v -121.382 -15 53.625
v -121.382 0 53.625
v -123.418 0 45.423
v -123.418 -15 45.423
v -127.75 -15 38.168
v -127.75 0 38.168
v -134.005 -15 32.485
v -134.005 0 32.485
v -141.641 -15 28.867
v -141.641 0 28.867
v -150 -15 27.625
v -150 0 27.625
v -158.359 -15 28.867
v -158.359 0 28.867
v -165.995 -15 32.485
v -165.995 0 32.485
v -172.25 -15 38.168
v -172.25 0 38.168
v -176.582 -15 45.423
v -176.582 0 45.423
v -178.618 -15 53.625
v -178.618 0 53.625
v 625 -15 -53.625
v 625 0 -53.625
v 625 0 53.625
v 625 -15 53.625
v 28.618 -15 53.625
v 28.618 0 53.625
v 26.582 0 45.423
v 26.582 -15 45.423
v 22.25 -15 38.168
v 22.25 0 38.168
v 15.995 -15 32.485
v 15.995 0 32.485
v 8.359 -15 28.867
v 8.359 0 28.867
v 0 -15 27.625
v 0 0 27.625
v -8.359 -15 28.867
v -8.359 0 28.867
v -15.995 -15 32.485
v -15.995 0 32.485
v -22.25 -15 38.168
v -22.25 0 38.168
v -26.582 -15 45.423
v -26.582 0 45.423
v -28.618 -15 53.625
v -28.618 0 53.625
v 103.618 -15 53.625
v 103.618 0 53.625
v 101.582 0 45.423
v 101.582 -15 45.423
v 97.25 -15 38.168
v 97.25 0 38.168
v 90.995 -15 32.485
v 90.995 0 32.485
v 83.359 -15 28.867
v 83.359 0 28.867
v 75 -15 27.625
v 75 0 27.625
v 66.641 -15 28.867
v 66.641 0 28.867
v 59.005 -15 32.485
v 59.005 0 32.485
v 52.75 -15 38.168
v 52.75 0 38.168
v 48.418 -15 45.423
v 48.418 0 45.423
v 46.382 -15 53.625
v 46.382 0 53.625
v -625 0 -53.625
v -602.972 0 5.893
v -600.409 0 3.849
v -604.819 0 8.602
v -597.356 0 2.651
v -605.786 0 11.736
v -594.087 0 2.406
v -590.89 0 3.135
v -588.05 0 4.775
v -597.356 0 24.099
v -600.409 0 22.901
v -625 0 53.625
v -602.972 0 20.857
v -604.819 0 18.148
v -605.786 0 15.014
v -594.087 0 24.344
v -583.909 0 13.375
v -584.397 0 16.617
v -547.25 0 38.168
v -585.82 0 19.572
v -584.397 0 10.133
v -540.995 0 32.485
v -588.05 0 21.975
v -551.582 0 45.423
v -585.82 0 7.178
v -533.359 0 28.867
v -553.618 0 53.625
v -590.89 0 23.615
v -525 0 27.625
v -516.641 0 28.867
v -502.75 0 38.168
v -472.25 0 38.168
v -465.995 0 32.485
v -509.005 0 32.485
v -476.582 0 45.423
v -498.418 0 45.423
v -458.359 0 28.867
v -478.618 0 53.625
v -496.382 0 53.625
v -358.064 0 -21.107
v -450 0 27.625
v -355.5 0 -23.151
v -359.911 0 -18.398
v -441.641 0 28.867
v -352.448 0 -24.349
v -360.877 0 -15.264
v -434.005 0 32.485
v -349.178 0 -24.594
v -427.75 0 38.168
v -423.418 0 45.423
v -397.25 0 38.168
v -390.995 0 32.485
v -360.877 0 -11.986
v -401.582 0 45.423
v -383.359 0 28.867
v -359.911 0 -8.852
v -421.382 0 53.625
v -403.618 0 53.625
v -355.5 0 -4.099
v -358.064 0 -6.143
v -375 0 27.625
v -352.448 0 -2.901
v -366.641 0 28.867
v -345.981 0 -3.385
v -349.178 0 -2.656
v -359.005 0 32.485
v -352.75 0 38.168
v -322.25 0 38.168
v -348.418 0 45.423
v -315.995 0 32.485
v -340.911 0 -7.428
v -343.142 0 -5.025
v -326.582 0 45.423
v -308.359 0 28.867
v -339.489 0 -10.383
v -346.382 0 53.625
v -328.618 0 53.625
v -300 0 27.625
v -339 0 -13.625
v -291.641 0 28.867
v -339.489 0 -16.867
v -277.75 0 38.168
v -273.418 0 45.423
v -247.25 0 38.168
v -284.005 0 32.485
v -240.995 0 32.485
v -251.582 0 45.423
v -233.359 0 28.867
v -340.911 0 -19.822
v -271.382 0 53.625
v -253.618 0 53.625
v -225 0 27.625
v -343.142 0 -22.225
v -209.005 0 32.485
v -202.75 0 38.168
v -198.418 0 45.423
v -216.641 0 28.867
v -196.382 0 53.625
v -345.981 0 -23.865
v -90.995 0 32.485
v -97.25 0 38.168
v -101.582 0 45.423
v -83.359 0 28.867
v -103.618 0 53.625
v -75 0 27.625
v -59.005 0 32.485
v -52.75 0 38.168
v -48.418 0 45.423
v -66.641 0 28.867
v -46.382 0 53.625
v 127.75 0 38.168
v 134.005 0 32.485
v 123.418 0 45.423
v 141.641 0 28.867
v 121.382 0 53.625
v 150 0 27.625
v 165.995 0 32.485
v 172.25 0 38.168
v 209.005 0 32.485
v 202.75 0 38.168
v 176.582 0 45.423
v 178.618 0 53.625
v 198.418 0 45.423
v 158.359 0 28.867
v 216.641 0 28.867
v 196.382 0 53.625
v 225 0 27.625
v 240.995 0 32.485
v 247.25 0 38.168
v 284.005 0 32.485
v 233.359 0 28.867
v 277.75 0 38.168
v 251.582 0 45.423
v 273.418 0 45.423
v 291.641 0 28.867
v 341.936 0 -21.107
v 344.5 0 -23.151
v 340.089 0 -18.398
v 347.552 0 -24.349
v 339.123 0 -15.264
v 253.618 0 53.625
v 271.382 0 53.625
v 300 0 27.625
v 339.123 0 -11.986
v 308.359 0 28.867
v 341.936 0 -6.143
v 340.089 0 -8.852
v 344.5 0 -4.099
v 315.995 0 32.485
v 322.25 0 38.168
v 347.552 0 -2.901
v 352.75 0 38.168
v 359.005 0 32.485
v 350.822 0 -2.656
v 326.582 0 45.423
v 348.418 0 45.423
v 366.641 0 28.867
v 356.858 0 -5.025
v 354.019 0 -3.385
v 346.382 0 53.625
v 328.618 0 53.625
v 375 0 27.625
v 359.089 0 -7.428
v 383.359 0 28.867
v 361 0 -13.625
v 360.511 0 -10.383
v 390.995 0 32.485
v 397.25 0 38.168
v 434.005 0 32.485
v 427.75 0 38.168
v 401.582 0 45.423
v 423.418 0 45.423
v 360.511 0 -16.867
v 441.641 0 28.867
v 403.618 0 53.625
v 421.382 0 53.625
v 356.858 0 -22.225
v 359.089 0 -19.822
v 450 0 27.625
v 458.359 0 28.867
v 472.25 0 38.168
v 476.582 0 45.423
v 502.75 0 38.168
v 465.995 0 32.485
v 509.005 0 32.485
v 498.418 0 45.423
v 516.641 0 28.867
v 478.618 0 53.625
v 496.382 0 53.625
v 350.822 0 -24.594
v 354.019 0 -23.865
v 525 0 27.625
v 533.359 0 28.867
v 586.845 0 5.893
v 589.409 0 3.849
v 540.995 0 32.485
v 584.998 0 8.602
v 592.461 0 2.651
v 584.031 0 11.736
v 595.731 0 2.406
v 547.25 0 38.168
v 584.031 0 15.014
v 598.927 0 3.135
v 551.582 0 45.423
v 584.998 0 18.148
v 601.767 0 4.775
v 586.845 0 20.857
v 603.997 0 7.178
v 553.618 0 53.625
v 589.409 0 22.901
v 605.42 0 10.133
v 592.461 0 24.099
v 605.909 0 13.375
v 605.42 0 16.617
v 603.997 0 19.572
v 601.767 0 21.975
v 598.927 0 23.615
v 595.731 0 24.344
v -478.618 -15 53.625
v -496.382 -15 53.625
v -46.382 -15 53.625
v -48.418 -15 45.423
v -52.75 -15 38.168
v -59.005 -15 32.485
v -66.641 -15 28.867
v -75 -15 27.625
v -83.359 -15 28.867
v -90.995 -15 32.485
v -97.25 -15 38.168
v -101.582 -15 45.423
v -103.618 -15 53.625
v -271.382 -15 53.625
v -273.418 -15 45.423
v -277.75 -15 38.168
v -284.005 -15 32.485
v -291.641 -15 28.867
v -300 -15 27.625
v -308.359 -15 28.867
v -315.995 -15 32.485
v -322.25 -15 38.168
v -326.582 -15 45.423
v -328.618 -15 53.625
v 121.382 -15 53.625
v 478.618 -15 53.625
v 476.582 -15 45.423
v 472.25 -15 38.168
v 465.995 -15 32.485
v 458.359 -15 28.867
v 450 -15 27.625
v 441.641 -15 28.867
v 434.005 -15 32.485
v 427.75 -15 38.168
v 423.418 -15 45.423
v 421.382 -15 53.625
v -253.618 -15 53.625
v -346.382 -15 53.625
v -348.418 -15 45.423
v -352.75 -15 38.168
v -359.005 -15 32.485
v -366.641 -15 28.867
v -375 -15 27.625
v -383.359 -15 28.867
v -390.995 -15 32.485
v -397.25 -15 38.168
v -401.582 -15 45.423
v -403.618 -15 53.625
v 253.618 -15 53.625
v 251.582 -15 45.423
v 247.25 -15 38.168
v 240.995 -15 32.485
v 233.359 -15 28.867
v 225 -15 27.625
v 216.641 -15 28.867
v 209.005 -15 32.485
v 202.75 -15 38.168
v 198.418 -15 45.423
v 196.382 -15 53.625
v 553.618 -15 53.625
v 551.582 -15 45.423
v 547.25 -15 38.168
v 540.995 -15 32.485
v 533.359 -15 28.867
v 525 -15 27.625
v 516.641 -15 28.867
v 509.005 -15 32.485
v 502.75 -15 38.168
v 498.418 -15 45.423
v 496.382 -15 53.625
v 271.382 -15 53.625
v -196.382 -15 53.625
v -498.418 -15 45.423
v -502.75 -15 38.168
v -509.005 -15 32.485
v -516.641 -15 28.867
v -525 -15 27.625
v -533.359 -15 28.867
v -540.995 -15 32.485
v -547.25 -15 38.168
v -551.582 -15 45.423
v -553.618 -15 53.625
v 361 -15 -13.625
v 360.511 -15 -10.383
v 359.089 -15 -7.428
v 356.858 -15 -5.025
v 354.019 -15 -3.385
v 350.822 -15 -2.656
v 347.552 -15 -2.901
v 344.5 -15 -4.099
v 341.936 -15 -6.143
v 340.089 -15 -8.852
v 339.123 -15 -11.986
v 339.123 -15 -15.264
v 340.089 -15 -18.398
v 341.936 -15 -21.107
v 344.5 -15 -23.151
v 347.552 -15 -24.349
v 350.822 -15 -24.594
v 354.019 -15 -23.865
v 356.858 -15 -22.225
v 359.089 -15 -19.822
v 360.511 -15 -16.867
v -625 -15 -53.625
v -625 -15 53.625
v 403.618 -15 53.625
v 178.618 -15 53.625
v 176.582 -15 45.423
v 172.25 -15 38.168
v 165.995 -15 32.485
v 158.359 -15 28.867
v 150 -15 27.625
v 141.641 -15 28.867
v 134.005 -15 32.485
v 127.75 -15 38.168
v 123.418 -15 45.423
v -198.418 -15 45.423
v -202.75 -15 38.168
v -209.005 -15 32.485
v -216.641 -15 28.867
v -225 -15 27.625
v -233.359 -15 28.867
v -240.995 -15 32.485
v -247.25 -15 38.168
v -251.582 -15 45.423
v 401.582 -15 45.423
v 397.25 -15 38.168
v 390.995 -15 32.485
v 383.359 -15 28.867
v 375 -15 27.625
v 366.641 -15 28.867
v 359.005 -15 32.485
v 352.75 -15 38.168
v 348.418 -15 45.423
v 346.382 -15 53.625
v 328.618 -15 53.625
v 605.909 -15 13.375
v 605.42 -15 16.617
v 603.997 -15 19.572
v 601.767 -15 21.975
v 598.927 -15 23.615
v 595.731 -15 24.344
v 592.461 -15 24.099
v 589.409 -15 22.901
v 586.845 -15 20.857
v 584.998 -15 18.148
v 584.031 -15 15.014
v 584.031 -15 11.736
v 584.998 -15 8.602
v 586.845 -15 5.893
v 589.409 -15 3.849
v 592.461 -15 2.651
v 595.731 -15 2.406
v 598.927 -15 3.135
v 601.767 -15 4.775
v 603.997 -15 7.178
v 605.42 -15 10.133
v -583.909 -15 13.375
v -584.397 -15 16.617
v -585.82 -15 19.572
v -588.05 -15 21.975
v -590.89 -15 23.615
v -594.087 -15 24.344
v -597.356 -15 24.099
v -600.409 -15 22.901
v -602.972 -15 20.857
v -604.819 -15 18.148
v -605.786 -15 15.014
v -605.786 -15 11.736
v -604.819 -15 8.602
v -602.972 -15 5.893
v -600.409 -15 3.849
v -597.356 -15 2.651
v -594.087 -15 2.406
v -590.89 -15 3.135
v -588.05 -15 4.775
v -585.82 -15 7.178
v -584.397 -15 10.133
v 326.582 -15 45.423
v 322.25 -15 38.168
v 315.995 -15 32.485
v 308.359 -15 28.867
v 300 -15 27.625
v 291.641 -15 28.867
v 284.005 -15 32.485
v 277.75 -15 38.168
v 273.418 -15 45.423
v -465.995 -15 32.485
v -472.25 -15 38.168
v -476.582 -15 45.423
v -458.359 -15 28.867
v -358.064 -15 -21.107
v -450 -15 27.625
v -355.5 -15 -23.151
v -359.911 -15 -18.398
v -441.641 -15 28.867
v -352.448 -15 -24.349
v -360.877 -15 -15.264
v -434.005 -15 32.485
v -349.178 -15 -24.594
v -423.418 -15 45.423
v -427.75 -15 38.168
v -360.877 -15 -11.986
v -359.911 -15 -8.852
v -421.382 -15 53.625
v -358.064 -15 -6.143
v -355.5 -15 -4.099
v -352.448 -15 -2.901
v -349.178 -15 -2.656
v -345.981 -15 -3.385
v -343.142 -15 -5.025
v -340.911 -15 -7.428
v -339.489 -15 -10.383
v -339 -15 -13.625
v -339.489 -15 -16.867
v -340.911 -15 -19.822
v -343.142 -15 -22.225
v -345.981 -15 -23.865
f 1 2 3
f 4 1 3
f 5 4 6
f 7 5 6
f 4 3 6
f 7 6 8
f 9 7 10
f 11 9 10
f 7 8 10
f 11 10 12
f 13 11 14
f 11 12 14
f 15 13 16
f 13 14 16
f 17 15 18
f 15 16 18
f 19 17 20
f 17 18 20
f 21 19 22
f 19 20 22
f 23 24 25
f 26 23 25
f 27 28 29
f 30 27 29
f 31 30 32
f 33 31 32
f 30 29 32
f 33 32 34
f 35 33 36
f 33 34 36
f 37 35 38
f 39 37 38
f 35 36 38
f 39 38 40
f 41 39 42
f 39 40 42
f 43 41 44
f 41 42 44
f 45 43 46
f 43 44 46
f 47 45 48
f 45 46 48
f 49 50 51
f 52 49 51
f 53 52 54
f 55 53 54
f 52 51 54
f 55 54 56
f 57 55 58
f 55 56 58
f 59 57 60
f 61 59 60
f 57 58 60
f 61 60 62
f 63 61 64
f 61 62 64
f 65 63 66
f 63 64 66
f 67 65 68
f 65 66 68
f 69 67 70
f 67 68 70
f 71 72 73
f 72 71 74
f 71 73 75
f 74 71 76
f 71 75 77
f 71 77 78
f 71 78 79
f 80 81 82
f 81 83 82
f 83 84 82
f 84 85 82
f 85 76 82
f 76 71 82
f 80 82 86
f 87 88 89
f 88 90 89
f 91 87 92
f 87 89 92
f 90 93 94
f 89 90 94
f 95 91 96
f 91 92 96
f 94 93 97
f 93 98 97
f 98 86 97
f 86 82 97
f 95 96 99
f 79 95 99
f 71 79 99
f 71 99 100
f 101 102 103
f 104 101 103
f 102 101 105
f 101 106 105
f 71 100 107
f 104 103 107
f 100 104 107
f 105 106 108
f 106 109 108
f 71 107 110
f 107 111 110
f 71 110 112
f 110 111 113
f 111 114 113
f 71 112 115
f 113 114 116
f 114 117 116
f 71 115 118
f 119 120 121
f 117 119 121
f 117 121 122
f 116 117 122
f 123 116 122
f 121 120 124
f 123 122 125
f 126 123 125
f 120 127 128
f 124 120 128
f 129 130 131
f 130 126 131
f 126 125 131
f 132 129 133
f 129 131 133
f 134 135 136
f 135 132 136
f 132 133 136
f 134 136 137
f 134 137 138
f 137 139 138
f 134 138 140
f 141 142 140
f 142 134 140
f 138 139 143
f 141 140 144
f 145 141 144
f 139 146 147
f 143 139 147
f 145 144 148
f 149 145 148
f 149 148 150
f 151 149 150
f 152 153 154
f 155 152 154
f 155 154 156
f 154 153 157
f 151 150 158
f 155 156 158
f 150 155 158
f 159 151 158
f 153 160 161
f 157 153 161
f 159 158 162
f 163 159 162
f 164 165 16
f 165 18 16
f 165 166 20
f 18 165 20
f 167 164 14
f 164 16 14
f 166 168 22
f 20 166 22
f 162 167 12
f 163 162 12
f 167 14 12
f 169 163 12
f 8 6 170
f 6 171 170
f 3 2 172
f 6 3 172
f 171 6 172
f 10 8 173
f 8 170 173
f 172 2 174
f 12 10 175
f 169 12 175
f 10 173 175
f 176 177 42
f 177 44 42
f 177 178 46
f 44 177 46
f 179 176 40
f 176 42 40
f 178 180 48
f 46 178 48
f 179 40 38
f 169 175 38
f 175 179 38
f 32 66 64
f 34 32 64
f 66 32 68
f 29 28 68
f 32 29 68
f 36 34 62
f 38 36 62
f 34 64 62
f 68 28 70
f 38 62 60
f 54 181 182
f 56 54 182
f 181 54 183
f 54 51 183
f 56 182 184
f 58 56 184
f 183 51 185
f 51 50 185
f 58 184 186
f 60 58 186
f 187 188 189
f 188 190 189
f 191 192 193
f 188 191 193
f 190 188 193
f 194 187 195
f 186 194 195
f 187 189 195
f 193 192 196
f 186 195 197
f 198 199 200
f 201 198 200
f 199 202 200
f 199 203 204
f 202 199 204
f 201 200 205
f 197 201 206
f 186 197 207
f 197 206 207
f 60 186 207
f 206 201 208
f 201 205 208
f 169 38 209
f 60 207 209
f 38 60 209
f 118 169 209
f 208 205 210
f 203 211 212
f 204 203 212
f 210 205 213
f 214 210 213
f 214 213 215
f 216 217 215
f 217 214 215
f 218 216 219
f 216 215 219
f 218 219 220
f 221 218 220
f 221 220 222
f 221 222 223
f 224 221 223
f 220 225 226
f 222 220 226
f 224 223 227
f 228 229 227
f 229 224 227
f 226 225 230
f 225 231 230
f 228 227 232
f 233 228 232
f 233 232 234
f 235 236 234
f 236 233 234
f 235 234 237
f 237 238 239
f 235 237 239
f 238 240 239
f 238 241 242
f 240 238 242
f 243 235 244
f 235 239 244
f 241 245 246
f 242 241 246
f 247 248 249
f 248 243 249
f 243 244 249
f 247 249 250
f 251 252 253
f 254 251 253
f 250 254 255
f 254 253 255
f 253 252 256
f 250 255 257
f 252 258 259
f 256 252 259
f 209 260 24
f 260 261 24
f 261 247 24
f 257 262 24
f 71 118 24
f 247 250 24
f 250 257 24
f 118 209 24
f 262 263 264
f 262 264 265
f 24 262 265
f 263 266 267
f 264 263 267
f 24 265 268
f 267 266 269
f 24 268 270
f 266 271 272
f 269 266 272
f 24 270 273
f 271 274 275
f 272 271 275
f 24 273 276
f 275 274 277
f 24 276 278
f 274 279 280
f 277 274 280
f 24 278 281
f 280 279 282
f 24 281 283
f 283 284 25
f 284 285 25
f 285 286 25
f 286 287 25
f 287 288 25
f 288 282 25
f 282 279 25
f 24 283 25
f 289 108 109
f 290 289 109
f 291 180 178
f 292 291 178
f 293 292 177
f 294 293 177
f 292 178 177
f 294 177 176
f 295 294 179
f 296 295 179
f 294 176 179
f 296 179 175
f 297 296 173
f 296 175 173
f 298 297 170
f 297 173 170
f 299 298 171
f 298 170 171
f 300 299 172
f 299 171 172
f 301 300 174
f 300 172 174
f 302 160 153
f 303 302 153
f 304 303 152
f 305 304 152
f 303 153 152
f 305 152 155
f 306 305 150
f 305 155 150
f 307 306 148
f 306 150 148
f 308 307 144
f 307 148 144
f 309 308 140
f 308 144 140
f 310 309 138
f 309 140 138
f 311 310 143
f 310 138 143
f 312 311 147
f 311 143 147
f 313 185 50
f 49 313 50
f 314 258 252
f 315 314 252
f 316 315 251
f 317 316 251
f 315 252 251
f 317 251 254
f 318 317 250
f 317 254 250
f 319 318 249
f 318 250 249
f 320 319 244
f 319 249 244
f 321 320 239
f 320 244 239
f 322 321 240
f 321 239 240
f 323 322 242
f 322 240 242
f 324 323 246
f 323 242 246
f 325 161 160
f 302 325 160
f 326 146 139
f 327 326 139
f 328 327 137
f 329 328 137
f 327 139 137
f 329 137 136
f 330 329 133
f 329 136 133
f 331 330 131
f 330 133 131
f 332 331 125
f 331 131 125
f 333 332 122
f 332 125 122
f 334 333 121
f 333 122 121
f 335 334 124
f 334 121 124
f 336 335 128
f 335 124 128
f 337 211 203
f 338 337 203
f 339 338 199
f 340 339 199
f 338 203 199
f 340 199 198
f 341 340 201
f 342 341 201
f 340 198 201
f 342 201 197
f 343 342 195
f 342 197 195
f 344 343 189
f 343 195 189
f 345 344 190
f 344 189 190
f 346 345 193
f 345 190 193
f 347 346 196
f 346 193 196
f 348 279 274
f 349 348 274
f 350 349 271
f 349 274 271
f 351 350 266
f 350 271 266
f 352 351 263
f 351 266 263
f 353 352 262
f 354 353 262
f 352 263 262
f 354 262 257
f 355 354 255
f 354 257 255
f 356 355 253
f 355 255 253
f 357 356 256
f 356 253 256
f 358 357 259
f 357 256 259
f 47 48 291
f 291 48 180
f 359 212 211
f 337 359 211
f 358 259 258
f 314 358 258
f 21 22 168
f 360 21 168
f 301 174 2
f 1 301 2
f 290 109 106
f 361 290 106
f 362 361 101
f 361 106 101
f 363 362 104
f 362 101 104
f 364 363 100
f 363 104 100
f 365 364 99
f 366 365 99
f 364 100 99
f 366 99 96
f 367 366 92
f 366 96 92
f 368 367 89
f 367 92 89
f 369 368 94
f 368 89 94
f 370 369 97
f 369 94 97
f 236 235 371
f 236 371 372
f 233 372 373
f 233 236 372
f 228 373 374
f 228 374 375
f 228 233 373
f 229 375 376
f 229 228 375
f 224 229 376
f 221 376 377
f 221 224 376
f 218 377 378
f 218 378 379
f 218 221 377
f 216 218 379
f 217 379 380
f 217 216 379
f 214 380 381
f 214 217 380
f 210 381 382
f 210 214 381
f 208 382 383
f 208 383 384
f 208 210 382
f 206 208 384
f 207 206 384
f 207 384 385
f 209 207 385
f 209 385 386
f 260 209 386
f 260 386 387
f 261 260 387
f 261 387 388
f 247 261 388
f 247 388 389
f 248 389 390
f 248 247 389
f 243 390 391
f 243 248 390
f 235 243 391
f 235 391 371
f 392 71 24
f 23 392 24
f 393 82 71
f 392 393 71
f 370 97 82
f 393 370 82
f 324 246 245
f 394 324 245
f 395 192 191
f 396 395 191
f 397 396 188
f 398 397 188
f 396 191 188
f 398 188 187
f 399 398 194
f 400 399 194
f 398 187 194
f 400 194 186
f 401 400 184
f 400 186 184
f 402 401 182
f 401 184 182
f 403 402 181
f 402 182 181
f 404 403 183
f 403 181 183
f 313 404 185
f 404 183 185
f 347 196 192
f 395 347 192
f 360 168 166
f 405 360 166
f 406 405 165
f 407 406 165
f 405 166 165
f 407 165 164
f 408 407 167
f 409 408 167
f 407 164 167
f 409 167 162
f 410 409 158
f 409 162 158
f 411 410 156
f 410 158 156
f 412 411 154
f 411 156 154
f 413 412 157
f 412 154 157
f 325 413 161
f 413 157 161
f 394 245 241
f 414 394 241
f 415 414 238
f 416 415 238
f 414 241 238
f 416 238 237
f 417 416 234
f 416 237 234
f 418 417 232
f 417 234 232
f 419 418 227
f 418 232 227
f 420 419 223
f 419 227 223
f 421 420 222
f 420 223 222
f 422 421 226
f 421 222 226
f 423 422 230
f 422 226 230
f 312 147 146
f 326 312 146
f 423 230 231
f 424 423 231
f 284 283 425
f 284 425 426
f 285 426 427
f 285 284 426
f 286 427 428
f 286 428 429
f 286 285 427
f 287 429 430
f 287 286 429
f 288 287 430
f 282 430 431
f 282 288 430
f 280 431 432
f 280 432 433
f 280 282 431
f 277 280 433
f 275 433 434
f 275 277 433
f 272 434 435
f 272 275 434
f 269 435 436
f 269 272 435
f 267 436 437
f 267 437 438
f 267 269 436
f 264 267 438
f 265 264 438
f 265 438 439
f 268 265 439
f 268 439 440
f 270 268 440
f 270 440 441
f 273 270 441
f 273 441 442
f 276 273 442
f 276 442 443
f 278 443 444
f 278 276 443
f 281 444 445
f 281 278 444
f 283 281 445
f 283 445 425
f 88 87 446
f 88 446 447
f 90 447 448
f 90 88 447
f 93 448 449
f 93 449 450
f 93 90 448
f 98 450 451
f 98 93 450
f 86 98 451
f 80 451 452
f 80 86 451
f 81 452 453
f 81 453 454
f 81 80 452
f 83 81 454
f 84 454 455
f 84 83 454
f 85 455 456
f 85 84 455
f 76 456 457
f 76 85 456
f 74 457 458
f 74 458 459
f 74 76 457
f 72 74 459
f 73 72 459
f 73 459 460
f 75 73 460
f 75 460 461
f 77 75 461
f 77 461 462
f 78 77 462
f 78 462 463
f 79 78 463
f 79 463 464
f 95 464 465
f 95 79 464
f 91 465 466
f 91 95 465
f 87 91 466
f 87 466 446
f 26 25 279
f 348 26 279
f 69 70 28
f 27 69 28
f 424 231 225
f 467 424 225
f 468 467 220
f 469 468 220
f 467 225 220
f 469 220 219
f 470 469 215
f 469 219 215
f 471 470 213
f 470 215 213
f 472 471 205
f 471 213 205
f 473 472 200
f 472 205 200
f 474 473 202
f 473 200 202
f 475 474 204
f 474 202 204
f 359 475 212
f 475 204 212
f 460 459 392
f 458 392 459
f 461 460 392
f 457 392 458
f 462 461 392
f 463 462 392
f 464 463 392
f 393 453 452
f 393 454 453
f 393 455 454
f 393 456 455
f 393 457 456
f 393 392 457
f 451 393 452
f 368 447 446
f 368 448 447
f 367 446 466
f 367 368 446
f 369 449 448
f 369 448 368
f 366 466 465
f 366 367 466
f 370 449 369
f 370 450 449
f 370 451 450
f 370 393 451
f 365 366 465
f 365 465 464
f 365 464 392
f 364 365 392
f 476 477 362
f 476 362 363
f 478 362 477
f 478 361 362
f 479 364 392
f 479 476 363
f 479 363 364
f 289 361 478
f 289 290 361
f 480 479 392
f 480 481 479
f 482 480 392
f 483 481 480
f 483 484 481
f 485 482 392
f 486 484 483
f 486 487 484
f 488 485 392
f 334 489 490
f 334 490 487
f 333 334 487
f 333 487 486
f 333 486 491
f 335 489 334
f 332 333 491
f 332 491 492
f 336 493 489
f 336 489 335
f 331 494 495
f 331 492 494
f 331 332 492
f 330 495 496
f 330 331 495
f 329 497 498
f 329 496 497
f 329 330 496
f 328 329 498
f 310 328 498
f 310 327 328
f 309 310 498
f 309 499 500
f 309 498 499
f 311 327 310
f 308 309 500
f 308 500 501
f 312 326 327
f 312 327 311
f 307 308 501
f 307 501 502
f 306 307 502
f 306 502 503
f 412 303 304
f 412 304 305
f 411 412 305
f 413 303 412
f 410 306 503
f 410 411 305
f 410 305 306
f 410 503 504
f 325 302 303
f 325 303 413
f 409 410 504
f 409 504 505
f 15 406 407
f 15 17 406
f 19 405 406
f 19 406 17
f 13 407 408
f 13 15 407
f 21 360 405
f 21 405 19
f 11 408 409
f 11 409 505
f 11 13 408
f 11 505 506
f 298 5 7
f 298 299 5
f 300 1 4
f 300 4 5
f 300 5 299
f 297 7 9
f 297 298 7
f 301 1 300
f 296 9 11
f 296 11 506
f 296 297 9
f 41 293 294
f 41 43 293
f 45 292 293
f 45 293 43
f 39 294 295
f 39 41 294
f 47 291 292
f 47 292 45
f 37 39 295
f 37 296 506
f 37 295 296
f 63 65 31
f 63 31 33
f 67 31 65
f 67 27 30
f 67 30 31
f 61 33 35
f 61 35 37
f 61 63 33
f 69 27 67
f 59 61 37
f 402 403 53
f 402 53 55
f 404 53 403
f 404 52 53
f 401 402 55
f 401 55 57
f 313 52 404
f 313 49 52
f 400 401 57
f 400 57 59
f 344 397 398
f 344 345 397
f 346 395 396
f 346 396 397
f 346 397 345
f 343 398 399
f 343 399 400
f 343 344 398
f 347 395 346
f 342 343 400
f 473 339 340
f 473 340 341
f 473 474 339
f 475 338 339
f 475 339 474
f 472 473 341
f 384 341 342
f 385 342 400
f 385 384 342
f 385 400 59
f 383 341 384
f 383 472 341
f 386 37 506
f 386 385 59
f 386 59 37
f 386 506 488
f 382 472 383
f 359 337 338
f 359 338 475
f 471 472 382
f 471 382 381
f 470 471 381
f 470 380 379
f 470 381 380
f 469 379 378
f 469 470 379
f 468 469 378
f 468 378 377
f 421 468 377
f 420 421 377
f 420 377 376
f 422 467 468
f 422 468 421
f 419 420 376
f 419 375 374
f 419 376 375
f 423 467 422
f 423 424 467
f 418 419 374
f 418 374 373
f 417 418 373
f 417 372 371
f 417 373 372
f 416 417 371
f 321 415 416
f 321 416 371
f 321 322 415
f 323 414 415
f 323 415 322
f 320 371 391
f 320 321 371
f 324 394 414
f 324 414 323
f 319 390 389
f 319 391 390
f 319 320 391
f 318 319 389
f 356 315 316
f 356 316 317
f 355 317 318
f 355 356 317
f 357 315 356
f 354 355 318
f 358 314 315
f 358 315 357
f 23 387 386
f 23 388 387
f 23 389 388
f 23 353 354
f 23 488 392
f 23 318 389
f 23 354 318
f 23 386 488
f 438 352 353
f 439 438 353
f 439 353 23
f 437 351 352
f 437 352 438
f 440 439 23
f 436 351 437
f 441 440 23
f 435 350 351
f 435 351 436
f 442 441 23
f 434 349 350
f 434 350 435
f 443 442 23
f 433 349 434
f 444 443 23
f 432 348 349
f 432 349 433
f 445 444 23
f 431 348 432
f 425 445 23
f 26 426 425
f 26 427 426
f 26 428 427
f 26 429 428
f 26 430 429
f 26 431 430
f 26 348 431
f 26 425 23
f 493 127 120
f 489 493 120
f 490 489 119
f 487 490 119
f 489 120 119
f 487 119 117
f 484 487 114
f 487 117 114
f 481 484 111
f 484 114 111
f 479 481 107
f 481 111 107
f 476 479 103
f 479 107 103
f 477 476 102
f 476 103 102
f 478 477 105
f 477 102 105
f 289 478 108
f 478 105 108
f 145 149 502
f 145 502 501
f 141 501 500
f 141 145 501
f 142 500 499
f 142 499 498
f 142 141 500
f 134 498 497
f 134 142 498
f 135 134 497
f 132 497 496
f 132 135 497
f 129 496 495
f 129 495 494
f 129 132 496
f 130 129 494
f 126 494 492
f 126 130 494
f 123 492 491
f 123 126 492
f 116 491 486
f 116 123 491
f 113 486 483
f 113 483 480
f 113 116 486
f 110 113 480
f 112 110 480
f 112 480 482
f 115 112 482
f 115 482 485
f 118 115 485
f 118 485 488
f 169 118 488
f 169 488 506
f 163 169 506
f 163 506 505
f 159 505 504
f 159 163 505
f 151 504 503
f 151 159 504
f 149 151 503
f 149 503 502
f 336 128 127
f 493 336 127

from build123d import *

# Parameters (mm, degrees)
F0_R     = 11
F1_DEPTH = 15


with BuildPart() as f1:
    # F0 (on Front) → F1 (new body)
    with BuildSketch(Plane.XZ):
        with BuildLine():
            Line((625, -53.625), (625, 53.625))
            Line((625, 53.625), (553.618176, 53.625))
            ThreePointArc((553.618176, 53.625), (525, 27.625), (496.381824, 53.625))
            Line((496.381824, 53.625), (478.618176, 53.625))
            ThreePointArc((478.618176, 53.625), (450, 27.625), (421.381824, 53.625))
            Line((421.381824, 53.625), (403.618176, 53.625))
            ThreePointArc((403.618176, 53.625), (375, 27.625), (346.381824, 53.625))
            Line((346.381824, 53.625), (328.618176, 53.625))
            ThreePointArc((328.618176, 53.625), (300, 27.625), (271.381824, 53.625))
            Line((271.381824, 53.625), (253.618176, 53.625))
            ThreePointArc((253.618176, 53.625), (225, 27.625), (196.381824, 53.625))
            Line((196.381824, 53.625), (178.618176, 53.625))
            ThreePointArc((178.618176, 53.625), (150, 27.625), (121.381824, 53.625))
            Line((121.381824, 53.625), (103.618176, 53.625))
            ThreePointArc((103.618176, 53.625), (75, 27.625), (46.381824, 53.625))
            Line((46.381824, 53.625), (28.618176, 53.625))
            ThreePointArc((28.618176, 53.625), (0, 27.625), (-28.618176, 53.625))
            Line((-28.618176, 53.625), (-46.381824, 53.625))
            ThreePointArc((-46.381824, 53.625), (-75, 27.625), (-103.618176, 53.625))
            Line((-103.618176, 53.625), (-121.381824, 53.625))
            ThreePointArc((-121.381824, 53.625), (-150, 27.625), (-178.618176, 53.625))
            Line((-178.618176, 53.625), (-196.381824, 53.625))
            ThreePointArc((-196.381824, 53.625), (-225, 27.625), (-253.618176, 53.625))
            Line((-253.618176, 53.625), (-271.381824, 53.625))
            ThreePointArc((-271.381824, 53.625), (-300, 27.625), (-328.618176, 53.625))
            Line((-328.618176, 53.625), (-346.381824, 53.625))
            ThreePointArc((-346.381824, 53.625), (-375, 27.625), (-403.618176, 53.625))
            Line((-403.618176, 53.625), (-421.381824, 53.625))
            ThreePointArc((-421.381824, 53.625), (-450, 27.625), (-478.618176, 53.625))
            Line((-478.618176, 53.625), (-496.381824, 53.625))
            ThreePointArc((-496.381824, 53.625), (-525, 27.625), (-553.618176, 53.625))
            Line((-553.618176, 53.625), (-625, 53.625))
            Line((-625, 53.625), (-625, -53.625))
            Line((-625, -53.625), (625, -53.625))
        make_face()
        with Locations((-350, -13.625)):
            Circle(F0_R, mode=Mode.SUBTRACT)
        with Locations((350, -13.625)):
            Circle(F0_R, mode=Mode.SUBTRACT)
        with Locations((-594.908628, 13.375)):
            Circle(F0_R, mode=Mode.SUBTRACT)
        with Locations((594.908628, 13.375)):
            Circle(F0_R, mode=Mode.SUBTRACT)
    extrude(amount=F1_DEPTH)


solid = f1.part
